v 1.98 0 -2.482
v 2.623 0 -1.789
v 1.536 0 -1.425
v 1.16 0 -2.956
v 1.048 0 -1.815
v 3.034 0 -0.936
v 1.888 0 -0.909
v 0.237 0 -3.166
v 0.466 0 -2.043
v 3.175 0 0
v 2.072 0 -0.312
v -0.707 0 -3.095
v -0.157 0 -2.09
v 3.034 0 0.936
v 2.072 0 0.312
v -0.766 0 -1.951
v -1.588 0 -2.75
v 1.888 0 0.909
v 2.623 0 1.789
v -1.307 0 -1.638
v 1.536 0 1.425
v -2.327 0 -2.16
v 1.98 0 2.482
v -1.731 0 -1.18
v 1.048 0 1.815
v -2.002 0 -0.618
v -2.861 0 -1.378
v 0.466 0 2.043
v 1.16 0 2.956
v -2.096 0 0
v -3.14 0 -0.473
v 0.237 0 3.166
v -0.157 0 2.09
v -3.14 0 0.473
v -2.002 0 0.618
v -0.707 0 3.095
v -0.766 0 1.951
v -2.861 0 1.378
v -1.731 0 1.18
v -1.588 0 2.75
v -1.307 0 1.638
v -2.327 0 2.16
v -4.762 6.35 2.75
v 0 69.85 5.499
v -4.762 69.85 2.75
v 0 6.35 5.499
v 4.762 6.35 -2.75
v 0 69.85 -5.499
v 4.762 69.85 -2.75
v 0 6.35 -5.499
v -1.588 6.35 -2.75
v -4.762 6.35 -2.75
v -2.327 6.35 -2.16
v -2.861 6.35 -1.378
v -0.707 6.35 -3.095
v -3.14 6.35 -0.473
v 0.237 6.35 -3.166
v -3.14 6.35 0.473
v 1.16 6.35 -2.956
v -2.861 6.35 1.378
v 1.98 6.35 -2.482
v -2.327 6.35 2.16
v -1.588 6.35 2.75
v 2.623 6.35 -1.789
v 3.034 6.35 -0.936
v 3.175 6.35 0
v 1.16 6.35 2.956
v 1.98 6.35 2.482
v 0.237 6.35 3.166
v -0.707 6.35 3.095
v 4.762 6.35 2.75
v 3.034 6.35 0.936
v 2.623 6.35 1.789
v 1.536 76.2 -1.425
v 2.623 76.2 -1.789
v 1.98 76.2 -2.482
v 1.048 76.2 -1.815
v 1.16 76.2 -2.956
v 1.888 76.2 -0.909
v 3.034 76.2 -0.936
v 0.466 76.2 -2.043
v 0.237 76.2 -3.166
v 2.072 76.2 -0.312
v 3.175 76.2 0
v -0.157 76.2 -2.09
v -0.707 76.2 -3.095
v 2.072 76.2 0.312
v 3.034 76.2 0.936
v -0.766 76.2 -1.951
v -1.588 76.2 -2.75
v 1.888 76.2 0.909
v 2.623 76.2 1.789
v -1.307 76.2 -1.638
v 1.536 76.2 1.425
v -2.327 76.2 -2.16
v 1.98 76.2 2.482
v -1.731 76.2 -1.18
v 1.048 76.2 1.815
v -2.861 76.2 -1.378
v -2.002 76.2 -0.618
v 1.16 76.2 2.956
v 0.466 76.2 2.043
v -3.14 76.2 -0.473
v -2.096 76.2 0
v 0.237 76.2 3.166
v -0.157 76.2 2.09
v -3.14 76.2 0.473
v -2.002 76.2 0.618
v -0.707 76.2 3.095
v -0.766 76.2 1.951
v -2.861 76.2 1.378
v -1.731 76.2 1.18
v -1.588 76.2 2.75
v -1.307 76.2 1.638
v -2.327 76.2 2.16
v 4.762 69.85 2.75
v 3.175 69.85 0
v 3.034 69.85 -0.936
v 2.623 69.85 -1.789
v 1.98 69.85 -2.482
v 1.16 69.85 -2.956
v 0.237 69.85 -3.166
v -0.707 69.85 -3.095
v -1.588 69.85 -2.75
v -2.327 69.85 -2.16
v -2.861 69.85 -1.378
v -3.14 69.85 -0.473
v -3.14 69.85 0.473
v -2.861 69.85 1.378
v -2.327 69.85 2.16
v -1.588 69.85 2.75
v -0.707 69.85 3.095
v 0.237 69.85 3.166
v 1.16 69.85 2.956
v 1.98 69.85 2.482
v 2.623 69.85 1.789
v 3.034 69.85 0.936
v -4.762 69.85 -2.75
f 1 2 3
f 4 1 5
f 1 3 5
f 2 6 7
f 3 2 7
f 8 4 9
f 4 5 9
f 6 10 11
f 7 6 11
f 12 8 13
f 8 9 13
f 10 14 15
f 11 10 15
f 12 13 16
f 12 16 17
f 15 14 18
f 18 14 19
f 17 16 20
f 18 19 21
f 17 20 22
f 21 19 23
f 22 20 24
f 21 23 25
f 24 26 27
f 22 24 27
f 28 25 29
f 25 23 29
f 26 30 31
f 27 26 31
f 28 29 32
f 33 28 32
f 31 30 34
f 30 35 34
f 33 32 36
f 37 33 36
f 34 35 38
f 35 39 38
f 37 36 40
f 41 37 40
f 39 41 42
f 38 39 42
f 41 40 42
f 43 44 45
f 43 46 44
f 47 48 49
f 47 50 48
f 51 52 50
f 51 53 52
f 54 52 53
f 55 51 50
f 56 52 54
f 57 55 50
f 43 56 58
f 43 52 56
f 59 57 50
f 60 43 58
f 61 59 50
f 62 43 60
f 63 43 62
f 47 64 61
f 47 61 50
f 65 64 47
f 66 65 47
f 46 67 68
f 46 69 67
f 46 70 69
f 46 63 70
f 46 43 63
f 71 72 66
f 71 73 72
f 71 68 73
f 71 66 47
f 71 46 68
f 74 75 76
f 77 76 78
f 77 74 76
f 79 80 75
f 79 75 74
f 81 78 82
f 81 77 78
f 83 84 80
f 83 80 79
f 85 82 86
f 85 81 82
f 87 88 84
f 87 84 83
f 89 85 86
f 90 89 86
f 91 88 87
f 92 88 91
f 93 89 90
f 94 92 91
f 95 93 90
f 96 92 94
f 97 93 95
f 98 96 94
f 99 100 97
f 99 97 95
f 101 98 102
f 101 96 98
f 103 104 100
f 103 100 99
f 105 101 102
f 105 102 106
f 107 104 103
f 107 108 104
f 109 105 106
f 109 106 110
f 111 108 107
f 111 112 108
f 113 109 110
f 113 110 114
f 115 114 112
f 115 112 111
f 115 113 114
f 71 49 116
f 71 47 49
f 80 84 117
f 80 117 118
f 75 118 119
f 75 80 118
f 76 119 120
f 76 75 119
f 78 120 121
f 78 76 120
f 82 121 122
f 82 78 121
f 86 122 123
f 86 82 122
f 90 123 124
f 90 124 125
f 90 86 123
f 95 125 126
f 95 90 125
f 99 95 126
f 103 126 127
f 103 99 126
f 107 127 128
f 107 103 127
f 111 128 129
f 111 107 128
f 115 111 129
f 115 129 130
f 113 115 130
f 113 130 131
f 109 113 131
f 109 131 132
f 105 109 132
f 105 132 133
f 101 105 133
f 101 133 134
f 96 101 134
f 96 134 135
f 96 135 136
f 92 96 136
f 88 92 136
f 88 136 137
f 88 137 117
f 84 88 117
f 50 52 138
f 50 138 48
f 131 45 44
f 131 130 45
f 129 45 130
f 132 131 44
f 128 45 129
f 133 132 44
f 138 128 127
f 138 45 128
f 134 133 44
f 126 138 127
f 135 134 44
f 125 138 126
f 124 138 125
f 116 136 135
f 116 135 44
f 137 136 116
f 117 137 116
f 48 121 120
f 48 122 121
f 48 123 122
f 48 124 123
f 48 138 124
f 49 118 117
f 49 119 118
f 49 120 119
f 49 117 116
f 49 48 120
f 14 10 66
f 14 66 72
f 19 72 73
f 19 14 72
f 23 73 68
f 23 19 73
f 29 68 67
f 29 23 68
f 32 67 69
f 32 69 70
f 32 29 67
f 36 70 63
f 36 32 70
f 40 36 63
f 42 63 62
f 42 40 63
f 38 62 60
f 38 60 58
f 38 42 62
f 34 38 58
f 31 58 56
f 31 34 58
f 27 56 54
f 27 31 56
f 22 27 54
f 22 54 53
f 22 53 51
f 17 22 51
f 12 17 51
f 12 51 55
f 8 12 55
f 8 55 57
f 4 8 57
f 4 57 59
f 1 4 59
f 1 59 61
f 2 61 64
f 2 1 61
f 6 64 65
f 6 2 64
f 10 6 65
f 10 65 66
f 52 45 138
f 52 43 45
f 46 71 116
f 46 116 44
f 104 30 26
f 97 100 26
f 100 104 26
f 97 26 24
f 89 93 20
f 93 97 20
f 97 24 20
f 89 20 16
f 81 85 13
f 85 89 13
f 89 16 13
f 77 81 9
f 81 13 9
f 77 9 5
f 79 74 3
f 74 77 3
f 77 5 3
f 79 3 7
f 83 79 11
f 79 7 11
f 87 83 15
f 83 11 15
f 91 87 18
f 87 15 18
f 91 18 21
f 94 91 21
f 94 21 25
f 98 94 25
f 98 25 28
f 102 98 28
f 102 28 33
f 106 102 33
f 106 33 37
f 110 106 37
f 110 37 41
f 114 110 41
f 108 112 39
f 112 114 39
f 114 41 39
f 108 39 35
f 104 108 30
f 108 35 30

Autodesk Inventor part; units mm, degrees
ref_plane "YZ Plane" through (0, 0, 0) normal (1, 0, 0) x (0, 1, 0)
ref_plane "XZ Plane" through (0, 0, 0) normal (0, 1, 0) x (-1, 0, 0)
ref_plane "XY Plane" through (0, 0, 0) normal (0, 0, 1) x (1, 0, 0)
sketch "Sketch1" plane through (0, 0, 0) normal (0, 1, 0) x (-1, 0, 0)
  line L0 (0, -5.4993) -> (-4.7625, -2.7496)
  line L1 (-4.7625, -2.7496) -> (-4.7625, 2.7496)
  line L2 (-4.7625, 2.7496) -> (0, 5.4993)
  line L3 (0, 5.4993) -> (4.7625, 2.7496)
  line L4 (4.7625, 2.7496) -> (4.7625, -2.7496)
  line L5 (4.7625, -2.7496) -> (0, -5.4993)
  circle A0 centre (0, 0) radius 2.0955
  dimension "d0" = 9.525
  dimension "d9" = 4.191
extrude "Extrusion1" add sketch "Sketch1" along normal blind 76.2
sketch "Sketch2" plane through (0, 76.2, 0) normal (0, 1, 0) x (1, 0, 0)
  circle A0 centre (0, 0) radius 3.175
  line L0 (-4.7625, 2.7496) -> (-4.7625, -2.7496) projected
  line L1 (-4.7625, -2.7496) -> (0, -5.4993) projected
  line L2 (0, -5.4993) -> (4.7625, -2.7496) projected
  line L3 (4.7625, -2.7496) -> (4.7625, 2.7496) projected
  line L4 (4.7625, 2.7496) -> (0, 5.4993) projected
  line L5 (0, 5.4993) -> (-4.7625, 2.7496) projected
  dimension "d3" = 6.35
extrude "Extrusion2" cut sketch "Sketch2" against normal blind 6.35
sketch "Sketch3" plane through (0, 0, 0) normal (0, -1, 0) x (1, 0, 0)
  circle A0 centre (0, 0) radius 3.175
  line L0 (-4.7625, -2.7496) -> (-4.7625, 2.7496) projected
  line L1 (0, -5.4993) -> (-4.7625, -2.7496) projected
  line L2 (4.7625, -2.7496) -> (0, -5.4993) projected
  line L3 (4.7625, 2.7496) -> (4.7625, -2.7496) projected
  line L4 (0, 5.4993) -> (4.7625, 2.7496) projected
  line L5 (-4.7625, 2.7496) -> (0, 5.4993) projected
  dimension "d6" = 6.35
extrude "Extrusion3" cut sketch "Sketch3" against normal blind 6.35
properties part number "PlanetShaft" material "Aluminum 6061"
